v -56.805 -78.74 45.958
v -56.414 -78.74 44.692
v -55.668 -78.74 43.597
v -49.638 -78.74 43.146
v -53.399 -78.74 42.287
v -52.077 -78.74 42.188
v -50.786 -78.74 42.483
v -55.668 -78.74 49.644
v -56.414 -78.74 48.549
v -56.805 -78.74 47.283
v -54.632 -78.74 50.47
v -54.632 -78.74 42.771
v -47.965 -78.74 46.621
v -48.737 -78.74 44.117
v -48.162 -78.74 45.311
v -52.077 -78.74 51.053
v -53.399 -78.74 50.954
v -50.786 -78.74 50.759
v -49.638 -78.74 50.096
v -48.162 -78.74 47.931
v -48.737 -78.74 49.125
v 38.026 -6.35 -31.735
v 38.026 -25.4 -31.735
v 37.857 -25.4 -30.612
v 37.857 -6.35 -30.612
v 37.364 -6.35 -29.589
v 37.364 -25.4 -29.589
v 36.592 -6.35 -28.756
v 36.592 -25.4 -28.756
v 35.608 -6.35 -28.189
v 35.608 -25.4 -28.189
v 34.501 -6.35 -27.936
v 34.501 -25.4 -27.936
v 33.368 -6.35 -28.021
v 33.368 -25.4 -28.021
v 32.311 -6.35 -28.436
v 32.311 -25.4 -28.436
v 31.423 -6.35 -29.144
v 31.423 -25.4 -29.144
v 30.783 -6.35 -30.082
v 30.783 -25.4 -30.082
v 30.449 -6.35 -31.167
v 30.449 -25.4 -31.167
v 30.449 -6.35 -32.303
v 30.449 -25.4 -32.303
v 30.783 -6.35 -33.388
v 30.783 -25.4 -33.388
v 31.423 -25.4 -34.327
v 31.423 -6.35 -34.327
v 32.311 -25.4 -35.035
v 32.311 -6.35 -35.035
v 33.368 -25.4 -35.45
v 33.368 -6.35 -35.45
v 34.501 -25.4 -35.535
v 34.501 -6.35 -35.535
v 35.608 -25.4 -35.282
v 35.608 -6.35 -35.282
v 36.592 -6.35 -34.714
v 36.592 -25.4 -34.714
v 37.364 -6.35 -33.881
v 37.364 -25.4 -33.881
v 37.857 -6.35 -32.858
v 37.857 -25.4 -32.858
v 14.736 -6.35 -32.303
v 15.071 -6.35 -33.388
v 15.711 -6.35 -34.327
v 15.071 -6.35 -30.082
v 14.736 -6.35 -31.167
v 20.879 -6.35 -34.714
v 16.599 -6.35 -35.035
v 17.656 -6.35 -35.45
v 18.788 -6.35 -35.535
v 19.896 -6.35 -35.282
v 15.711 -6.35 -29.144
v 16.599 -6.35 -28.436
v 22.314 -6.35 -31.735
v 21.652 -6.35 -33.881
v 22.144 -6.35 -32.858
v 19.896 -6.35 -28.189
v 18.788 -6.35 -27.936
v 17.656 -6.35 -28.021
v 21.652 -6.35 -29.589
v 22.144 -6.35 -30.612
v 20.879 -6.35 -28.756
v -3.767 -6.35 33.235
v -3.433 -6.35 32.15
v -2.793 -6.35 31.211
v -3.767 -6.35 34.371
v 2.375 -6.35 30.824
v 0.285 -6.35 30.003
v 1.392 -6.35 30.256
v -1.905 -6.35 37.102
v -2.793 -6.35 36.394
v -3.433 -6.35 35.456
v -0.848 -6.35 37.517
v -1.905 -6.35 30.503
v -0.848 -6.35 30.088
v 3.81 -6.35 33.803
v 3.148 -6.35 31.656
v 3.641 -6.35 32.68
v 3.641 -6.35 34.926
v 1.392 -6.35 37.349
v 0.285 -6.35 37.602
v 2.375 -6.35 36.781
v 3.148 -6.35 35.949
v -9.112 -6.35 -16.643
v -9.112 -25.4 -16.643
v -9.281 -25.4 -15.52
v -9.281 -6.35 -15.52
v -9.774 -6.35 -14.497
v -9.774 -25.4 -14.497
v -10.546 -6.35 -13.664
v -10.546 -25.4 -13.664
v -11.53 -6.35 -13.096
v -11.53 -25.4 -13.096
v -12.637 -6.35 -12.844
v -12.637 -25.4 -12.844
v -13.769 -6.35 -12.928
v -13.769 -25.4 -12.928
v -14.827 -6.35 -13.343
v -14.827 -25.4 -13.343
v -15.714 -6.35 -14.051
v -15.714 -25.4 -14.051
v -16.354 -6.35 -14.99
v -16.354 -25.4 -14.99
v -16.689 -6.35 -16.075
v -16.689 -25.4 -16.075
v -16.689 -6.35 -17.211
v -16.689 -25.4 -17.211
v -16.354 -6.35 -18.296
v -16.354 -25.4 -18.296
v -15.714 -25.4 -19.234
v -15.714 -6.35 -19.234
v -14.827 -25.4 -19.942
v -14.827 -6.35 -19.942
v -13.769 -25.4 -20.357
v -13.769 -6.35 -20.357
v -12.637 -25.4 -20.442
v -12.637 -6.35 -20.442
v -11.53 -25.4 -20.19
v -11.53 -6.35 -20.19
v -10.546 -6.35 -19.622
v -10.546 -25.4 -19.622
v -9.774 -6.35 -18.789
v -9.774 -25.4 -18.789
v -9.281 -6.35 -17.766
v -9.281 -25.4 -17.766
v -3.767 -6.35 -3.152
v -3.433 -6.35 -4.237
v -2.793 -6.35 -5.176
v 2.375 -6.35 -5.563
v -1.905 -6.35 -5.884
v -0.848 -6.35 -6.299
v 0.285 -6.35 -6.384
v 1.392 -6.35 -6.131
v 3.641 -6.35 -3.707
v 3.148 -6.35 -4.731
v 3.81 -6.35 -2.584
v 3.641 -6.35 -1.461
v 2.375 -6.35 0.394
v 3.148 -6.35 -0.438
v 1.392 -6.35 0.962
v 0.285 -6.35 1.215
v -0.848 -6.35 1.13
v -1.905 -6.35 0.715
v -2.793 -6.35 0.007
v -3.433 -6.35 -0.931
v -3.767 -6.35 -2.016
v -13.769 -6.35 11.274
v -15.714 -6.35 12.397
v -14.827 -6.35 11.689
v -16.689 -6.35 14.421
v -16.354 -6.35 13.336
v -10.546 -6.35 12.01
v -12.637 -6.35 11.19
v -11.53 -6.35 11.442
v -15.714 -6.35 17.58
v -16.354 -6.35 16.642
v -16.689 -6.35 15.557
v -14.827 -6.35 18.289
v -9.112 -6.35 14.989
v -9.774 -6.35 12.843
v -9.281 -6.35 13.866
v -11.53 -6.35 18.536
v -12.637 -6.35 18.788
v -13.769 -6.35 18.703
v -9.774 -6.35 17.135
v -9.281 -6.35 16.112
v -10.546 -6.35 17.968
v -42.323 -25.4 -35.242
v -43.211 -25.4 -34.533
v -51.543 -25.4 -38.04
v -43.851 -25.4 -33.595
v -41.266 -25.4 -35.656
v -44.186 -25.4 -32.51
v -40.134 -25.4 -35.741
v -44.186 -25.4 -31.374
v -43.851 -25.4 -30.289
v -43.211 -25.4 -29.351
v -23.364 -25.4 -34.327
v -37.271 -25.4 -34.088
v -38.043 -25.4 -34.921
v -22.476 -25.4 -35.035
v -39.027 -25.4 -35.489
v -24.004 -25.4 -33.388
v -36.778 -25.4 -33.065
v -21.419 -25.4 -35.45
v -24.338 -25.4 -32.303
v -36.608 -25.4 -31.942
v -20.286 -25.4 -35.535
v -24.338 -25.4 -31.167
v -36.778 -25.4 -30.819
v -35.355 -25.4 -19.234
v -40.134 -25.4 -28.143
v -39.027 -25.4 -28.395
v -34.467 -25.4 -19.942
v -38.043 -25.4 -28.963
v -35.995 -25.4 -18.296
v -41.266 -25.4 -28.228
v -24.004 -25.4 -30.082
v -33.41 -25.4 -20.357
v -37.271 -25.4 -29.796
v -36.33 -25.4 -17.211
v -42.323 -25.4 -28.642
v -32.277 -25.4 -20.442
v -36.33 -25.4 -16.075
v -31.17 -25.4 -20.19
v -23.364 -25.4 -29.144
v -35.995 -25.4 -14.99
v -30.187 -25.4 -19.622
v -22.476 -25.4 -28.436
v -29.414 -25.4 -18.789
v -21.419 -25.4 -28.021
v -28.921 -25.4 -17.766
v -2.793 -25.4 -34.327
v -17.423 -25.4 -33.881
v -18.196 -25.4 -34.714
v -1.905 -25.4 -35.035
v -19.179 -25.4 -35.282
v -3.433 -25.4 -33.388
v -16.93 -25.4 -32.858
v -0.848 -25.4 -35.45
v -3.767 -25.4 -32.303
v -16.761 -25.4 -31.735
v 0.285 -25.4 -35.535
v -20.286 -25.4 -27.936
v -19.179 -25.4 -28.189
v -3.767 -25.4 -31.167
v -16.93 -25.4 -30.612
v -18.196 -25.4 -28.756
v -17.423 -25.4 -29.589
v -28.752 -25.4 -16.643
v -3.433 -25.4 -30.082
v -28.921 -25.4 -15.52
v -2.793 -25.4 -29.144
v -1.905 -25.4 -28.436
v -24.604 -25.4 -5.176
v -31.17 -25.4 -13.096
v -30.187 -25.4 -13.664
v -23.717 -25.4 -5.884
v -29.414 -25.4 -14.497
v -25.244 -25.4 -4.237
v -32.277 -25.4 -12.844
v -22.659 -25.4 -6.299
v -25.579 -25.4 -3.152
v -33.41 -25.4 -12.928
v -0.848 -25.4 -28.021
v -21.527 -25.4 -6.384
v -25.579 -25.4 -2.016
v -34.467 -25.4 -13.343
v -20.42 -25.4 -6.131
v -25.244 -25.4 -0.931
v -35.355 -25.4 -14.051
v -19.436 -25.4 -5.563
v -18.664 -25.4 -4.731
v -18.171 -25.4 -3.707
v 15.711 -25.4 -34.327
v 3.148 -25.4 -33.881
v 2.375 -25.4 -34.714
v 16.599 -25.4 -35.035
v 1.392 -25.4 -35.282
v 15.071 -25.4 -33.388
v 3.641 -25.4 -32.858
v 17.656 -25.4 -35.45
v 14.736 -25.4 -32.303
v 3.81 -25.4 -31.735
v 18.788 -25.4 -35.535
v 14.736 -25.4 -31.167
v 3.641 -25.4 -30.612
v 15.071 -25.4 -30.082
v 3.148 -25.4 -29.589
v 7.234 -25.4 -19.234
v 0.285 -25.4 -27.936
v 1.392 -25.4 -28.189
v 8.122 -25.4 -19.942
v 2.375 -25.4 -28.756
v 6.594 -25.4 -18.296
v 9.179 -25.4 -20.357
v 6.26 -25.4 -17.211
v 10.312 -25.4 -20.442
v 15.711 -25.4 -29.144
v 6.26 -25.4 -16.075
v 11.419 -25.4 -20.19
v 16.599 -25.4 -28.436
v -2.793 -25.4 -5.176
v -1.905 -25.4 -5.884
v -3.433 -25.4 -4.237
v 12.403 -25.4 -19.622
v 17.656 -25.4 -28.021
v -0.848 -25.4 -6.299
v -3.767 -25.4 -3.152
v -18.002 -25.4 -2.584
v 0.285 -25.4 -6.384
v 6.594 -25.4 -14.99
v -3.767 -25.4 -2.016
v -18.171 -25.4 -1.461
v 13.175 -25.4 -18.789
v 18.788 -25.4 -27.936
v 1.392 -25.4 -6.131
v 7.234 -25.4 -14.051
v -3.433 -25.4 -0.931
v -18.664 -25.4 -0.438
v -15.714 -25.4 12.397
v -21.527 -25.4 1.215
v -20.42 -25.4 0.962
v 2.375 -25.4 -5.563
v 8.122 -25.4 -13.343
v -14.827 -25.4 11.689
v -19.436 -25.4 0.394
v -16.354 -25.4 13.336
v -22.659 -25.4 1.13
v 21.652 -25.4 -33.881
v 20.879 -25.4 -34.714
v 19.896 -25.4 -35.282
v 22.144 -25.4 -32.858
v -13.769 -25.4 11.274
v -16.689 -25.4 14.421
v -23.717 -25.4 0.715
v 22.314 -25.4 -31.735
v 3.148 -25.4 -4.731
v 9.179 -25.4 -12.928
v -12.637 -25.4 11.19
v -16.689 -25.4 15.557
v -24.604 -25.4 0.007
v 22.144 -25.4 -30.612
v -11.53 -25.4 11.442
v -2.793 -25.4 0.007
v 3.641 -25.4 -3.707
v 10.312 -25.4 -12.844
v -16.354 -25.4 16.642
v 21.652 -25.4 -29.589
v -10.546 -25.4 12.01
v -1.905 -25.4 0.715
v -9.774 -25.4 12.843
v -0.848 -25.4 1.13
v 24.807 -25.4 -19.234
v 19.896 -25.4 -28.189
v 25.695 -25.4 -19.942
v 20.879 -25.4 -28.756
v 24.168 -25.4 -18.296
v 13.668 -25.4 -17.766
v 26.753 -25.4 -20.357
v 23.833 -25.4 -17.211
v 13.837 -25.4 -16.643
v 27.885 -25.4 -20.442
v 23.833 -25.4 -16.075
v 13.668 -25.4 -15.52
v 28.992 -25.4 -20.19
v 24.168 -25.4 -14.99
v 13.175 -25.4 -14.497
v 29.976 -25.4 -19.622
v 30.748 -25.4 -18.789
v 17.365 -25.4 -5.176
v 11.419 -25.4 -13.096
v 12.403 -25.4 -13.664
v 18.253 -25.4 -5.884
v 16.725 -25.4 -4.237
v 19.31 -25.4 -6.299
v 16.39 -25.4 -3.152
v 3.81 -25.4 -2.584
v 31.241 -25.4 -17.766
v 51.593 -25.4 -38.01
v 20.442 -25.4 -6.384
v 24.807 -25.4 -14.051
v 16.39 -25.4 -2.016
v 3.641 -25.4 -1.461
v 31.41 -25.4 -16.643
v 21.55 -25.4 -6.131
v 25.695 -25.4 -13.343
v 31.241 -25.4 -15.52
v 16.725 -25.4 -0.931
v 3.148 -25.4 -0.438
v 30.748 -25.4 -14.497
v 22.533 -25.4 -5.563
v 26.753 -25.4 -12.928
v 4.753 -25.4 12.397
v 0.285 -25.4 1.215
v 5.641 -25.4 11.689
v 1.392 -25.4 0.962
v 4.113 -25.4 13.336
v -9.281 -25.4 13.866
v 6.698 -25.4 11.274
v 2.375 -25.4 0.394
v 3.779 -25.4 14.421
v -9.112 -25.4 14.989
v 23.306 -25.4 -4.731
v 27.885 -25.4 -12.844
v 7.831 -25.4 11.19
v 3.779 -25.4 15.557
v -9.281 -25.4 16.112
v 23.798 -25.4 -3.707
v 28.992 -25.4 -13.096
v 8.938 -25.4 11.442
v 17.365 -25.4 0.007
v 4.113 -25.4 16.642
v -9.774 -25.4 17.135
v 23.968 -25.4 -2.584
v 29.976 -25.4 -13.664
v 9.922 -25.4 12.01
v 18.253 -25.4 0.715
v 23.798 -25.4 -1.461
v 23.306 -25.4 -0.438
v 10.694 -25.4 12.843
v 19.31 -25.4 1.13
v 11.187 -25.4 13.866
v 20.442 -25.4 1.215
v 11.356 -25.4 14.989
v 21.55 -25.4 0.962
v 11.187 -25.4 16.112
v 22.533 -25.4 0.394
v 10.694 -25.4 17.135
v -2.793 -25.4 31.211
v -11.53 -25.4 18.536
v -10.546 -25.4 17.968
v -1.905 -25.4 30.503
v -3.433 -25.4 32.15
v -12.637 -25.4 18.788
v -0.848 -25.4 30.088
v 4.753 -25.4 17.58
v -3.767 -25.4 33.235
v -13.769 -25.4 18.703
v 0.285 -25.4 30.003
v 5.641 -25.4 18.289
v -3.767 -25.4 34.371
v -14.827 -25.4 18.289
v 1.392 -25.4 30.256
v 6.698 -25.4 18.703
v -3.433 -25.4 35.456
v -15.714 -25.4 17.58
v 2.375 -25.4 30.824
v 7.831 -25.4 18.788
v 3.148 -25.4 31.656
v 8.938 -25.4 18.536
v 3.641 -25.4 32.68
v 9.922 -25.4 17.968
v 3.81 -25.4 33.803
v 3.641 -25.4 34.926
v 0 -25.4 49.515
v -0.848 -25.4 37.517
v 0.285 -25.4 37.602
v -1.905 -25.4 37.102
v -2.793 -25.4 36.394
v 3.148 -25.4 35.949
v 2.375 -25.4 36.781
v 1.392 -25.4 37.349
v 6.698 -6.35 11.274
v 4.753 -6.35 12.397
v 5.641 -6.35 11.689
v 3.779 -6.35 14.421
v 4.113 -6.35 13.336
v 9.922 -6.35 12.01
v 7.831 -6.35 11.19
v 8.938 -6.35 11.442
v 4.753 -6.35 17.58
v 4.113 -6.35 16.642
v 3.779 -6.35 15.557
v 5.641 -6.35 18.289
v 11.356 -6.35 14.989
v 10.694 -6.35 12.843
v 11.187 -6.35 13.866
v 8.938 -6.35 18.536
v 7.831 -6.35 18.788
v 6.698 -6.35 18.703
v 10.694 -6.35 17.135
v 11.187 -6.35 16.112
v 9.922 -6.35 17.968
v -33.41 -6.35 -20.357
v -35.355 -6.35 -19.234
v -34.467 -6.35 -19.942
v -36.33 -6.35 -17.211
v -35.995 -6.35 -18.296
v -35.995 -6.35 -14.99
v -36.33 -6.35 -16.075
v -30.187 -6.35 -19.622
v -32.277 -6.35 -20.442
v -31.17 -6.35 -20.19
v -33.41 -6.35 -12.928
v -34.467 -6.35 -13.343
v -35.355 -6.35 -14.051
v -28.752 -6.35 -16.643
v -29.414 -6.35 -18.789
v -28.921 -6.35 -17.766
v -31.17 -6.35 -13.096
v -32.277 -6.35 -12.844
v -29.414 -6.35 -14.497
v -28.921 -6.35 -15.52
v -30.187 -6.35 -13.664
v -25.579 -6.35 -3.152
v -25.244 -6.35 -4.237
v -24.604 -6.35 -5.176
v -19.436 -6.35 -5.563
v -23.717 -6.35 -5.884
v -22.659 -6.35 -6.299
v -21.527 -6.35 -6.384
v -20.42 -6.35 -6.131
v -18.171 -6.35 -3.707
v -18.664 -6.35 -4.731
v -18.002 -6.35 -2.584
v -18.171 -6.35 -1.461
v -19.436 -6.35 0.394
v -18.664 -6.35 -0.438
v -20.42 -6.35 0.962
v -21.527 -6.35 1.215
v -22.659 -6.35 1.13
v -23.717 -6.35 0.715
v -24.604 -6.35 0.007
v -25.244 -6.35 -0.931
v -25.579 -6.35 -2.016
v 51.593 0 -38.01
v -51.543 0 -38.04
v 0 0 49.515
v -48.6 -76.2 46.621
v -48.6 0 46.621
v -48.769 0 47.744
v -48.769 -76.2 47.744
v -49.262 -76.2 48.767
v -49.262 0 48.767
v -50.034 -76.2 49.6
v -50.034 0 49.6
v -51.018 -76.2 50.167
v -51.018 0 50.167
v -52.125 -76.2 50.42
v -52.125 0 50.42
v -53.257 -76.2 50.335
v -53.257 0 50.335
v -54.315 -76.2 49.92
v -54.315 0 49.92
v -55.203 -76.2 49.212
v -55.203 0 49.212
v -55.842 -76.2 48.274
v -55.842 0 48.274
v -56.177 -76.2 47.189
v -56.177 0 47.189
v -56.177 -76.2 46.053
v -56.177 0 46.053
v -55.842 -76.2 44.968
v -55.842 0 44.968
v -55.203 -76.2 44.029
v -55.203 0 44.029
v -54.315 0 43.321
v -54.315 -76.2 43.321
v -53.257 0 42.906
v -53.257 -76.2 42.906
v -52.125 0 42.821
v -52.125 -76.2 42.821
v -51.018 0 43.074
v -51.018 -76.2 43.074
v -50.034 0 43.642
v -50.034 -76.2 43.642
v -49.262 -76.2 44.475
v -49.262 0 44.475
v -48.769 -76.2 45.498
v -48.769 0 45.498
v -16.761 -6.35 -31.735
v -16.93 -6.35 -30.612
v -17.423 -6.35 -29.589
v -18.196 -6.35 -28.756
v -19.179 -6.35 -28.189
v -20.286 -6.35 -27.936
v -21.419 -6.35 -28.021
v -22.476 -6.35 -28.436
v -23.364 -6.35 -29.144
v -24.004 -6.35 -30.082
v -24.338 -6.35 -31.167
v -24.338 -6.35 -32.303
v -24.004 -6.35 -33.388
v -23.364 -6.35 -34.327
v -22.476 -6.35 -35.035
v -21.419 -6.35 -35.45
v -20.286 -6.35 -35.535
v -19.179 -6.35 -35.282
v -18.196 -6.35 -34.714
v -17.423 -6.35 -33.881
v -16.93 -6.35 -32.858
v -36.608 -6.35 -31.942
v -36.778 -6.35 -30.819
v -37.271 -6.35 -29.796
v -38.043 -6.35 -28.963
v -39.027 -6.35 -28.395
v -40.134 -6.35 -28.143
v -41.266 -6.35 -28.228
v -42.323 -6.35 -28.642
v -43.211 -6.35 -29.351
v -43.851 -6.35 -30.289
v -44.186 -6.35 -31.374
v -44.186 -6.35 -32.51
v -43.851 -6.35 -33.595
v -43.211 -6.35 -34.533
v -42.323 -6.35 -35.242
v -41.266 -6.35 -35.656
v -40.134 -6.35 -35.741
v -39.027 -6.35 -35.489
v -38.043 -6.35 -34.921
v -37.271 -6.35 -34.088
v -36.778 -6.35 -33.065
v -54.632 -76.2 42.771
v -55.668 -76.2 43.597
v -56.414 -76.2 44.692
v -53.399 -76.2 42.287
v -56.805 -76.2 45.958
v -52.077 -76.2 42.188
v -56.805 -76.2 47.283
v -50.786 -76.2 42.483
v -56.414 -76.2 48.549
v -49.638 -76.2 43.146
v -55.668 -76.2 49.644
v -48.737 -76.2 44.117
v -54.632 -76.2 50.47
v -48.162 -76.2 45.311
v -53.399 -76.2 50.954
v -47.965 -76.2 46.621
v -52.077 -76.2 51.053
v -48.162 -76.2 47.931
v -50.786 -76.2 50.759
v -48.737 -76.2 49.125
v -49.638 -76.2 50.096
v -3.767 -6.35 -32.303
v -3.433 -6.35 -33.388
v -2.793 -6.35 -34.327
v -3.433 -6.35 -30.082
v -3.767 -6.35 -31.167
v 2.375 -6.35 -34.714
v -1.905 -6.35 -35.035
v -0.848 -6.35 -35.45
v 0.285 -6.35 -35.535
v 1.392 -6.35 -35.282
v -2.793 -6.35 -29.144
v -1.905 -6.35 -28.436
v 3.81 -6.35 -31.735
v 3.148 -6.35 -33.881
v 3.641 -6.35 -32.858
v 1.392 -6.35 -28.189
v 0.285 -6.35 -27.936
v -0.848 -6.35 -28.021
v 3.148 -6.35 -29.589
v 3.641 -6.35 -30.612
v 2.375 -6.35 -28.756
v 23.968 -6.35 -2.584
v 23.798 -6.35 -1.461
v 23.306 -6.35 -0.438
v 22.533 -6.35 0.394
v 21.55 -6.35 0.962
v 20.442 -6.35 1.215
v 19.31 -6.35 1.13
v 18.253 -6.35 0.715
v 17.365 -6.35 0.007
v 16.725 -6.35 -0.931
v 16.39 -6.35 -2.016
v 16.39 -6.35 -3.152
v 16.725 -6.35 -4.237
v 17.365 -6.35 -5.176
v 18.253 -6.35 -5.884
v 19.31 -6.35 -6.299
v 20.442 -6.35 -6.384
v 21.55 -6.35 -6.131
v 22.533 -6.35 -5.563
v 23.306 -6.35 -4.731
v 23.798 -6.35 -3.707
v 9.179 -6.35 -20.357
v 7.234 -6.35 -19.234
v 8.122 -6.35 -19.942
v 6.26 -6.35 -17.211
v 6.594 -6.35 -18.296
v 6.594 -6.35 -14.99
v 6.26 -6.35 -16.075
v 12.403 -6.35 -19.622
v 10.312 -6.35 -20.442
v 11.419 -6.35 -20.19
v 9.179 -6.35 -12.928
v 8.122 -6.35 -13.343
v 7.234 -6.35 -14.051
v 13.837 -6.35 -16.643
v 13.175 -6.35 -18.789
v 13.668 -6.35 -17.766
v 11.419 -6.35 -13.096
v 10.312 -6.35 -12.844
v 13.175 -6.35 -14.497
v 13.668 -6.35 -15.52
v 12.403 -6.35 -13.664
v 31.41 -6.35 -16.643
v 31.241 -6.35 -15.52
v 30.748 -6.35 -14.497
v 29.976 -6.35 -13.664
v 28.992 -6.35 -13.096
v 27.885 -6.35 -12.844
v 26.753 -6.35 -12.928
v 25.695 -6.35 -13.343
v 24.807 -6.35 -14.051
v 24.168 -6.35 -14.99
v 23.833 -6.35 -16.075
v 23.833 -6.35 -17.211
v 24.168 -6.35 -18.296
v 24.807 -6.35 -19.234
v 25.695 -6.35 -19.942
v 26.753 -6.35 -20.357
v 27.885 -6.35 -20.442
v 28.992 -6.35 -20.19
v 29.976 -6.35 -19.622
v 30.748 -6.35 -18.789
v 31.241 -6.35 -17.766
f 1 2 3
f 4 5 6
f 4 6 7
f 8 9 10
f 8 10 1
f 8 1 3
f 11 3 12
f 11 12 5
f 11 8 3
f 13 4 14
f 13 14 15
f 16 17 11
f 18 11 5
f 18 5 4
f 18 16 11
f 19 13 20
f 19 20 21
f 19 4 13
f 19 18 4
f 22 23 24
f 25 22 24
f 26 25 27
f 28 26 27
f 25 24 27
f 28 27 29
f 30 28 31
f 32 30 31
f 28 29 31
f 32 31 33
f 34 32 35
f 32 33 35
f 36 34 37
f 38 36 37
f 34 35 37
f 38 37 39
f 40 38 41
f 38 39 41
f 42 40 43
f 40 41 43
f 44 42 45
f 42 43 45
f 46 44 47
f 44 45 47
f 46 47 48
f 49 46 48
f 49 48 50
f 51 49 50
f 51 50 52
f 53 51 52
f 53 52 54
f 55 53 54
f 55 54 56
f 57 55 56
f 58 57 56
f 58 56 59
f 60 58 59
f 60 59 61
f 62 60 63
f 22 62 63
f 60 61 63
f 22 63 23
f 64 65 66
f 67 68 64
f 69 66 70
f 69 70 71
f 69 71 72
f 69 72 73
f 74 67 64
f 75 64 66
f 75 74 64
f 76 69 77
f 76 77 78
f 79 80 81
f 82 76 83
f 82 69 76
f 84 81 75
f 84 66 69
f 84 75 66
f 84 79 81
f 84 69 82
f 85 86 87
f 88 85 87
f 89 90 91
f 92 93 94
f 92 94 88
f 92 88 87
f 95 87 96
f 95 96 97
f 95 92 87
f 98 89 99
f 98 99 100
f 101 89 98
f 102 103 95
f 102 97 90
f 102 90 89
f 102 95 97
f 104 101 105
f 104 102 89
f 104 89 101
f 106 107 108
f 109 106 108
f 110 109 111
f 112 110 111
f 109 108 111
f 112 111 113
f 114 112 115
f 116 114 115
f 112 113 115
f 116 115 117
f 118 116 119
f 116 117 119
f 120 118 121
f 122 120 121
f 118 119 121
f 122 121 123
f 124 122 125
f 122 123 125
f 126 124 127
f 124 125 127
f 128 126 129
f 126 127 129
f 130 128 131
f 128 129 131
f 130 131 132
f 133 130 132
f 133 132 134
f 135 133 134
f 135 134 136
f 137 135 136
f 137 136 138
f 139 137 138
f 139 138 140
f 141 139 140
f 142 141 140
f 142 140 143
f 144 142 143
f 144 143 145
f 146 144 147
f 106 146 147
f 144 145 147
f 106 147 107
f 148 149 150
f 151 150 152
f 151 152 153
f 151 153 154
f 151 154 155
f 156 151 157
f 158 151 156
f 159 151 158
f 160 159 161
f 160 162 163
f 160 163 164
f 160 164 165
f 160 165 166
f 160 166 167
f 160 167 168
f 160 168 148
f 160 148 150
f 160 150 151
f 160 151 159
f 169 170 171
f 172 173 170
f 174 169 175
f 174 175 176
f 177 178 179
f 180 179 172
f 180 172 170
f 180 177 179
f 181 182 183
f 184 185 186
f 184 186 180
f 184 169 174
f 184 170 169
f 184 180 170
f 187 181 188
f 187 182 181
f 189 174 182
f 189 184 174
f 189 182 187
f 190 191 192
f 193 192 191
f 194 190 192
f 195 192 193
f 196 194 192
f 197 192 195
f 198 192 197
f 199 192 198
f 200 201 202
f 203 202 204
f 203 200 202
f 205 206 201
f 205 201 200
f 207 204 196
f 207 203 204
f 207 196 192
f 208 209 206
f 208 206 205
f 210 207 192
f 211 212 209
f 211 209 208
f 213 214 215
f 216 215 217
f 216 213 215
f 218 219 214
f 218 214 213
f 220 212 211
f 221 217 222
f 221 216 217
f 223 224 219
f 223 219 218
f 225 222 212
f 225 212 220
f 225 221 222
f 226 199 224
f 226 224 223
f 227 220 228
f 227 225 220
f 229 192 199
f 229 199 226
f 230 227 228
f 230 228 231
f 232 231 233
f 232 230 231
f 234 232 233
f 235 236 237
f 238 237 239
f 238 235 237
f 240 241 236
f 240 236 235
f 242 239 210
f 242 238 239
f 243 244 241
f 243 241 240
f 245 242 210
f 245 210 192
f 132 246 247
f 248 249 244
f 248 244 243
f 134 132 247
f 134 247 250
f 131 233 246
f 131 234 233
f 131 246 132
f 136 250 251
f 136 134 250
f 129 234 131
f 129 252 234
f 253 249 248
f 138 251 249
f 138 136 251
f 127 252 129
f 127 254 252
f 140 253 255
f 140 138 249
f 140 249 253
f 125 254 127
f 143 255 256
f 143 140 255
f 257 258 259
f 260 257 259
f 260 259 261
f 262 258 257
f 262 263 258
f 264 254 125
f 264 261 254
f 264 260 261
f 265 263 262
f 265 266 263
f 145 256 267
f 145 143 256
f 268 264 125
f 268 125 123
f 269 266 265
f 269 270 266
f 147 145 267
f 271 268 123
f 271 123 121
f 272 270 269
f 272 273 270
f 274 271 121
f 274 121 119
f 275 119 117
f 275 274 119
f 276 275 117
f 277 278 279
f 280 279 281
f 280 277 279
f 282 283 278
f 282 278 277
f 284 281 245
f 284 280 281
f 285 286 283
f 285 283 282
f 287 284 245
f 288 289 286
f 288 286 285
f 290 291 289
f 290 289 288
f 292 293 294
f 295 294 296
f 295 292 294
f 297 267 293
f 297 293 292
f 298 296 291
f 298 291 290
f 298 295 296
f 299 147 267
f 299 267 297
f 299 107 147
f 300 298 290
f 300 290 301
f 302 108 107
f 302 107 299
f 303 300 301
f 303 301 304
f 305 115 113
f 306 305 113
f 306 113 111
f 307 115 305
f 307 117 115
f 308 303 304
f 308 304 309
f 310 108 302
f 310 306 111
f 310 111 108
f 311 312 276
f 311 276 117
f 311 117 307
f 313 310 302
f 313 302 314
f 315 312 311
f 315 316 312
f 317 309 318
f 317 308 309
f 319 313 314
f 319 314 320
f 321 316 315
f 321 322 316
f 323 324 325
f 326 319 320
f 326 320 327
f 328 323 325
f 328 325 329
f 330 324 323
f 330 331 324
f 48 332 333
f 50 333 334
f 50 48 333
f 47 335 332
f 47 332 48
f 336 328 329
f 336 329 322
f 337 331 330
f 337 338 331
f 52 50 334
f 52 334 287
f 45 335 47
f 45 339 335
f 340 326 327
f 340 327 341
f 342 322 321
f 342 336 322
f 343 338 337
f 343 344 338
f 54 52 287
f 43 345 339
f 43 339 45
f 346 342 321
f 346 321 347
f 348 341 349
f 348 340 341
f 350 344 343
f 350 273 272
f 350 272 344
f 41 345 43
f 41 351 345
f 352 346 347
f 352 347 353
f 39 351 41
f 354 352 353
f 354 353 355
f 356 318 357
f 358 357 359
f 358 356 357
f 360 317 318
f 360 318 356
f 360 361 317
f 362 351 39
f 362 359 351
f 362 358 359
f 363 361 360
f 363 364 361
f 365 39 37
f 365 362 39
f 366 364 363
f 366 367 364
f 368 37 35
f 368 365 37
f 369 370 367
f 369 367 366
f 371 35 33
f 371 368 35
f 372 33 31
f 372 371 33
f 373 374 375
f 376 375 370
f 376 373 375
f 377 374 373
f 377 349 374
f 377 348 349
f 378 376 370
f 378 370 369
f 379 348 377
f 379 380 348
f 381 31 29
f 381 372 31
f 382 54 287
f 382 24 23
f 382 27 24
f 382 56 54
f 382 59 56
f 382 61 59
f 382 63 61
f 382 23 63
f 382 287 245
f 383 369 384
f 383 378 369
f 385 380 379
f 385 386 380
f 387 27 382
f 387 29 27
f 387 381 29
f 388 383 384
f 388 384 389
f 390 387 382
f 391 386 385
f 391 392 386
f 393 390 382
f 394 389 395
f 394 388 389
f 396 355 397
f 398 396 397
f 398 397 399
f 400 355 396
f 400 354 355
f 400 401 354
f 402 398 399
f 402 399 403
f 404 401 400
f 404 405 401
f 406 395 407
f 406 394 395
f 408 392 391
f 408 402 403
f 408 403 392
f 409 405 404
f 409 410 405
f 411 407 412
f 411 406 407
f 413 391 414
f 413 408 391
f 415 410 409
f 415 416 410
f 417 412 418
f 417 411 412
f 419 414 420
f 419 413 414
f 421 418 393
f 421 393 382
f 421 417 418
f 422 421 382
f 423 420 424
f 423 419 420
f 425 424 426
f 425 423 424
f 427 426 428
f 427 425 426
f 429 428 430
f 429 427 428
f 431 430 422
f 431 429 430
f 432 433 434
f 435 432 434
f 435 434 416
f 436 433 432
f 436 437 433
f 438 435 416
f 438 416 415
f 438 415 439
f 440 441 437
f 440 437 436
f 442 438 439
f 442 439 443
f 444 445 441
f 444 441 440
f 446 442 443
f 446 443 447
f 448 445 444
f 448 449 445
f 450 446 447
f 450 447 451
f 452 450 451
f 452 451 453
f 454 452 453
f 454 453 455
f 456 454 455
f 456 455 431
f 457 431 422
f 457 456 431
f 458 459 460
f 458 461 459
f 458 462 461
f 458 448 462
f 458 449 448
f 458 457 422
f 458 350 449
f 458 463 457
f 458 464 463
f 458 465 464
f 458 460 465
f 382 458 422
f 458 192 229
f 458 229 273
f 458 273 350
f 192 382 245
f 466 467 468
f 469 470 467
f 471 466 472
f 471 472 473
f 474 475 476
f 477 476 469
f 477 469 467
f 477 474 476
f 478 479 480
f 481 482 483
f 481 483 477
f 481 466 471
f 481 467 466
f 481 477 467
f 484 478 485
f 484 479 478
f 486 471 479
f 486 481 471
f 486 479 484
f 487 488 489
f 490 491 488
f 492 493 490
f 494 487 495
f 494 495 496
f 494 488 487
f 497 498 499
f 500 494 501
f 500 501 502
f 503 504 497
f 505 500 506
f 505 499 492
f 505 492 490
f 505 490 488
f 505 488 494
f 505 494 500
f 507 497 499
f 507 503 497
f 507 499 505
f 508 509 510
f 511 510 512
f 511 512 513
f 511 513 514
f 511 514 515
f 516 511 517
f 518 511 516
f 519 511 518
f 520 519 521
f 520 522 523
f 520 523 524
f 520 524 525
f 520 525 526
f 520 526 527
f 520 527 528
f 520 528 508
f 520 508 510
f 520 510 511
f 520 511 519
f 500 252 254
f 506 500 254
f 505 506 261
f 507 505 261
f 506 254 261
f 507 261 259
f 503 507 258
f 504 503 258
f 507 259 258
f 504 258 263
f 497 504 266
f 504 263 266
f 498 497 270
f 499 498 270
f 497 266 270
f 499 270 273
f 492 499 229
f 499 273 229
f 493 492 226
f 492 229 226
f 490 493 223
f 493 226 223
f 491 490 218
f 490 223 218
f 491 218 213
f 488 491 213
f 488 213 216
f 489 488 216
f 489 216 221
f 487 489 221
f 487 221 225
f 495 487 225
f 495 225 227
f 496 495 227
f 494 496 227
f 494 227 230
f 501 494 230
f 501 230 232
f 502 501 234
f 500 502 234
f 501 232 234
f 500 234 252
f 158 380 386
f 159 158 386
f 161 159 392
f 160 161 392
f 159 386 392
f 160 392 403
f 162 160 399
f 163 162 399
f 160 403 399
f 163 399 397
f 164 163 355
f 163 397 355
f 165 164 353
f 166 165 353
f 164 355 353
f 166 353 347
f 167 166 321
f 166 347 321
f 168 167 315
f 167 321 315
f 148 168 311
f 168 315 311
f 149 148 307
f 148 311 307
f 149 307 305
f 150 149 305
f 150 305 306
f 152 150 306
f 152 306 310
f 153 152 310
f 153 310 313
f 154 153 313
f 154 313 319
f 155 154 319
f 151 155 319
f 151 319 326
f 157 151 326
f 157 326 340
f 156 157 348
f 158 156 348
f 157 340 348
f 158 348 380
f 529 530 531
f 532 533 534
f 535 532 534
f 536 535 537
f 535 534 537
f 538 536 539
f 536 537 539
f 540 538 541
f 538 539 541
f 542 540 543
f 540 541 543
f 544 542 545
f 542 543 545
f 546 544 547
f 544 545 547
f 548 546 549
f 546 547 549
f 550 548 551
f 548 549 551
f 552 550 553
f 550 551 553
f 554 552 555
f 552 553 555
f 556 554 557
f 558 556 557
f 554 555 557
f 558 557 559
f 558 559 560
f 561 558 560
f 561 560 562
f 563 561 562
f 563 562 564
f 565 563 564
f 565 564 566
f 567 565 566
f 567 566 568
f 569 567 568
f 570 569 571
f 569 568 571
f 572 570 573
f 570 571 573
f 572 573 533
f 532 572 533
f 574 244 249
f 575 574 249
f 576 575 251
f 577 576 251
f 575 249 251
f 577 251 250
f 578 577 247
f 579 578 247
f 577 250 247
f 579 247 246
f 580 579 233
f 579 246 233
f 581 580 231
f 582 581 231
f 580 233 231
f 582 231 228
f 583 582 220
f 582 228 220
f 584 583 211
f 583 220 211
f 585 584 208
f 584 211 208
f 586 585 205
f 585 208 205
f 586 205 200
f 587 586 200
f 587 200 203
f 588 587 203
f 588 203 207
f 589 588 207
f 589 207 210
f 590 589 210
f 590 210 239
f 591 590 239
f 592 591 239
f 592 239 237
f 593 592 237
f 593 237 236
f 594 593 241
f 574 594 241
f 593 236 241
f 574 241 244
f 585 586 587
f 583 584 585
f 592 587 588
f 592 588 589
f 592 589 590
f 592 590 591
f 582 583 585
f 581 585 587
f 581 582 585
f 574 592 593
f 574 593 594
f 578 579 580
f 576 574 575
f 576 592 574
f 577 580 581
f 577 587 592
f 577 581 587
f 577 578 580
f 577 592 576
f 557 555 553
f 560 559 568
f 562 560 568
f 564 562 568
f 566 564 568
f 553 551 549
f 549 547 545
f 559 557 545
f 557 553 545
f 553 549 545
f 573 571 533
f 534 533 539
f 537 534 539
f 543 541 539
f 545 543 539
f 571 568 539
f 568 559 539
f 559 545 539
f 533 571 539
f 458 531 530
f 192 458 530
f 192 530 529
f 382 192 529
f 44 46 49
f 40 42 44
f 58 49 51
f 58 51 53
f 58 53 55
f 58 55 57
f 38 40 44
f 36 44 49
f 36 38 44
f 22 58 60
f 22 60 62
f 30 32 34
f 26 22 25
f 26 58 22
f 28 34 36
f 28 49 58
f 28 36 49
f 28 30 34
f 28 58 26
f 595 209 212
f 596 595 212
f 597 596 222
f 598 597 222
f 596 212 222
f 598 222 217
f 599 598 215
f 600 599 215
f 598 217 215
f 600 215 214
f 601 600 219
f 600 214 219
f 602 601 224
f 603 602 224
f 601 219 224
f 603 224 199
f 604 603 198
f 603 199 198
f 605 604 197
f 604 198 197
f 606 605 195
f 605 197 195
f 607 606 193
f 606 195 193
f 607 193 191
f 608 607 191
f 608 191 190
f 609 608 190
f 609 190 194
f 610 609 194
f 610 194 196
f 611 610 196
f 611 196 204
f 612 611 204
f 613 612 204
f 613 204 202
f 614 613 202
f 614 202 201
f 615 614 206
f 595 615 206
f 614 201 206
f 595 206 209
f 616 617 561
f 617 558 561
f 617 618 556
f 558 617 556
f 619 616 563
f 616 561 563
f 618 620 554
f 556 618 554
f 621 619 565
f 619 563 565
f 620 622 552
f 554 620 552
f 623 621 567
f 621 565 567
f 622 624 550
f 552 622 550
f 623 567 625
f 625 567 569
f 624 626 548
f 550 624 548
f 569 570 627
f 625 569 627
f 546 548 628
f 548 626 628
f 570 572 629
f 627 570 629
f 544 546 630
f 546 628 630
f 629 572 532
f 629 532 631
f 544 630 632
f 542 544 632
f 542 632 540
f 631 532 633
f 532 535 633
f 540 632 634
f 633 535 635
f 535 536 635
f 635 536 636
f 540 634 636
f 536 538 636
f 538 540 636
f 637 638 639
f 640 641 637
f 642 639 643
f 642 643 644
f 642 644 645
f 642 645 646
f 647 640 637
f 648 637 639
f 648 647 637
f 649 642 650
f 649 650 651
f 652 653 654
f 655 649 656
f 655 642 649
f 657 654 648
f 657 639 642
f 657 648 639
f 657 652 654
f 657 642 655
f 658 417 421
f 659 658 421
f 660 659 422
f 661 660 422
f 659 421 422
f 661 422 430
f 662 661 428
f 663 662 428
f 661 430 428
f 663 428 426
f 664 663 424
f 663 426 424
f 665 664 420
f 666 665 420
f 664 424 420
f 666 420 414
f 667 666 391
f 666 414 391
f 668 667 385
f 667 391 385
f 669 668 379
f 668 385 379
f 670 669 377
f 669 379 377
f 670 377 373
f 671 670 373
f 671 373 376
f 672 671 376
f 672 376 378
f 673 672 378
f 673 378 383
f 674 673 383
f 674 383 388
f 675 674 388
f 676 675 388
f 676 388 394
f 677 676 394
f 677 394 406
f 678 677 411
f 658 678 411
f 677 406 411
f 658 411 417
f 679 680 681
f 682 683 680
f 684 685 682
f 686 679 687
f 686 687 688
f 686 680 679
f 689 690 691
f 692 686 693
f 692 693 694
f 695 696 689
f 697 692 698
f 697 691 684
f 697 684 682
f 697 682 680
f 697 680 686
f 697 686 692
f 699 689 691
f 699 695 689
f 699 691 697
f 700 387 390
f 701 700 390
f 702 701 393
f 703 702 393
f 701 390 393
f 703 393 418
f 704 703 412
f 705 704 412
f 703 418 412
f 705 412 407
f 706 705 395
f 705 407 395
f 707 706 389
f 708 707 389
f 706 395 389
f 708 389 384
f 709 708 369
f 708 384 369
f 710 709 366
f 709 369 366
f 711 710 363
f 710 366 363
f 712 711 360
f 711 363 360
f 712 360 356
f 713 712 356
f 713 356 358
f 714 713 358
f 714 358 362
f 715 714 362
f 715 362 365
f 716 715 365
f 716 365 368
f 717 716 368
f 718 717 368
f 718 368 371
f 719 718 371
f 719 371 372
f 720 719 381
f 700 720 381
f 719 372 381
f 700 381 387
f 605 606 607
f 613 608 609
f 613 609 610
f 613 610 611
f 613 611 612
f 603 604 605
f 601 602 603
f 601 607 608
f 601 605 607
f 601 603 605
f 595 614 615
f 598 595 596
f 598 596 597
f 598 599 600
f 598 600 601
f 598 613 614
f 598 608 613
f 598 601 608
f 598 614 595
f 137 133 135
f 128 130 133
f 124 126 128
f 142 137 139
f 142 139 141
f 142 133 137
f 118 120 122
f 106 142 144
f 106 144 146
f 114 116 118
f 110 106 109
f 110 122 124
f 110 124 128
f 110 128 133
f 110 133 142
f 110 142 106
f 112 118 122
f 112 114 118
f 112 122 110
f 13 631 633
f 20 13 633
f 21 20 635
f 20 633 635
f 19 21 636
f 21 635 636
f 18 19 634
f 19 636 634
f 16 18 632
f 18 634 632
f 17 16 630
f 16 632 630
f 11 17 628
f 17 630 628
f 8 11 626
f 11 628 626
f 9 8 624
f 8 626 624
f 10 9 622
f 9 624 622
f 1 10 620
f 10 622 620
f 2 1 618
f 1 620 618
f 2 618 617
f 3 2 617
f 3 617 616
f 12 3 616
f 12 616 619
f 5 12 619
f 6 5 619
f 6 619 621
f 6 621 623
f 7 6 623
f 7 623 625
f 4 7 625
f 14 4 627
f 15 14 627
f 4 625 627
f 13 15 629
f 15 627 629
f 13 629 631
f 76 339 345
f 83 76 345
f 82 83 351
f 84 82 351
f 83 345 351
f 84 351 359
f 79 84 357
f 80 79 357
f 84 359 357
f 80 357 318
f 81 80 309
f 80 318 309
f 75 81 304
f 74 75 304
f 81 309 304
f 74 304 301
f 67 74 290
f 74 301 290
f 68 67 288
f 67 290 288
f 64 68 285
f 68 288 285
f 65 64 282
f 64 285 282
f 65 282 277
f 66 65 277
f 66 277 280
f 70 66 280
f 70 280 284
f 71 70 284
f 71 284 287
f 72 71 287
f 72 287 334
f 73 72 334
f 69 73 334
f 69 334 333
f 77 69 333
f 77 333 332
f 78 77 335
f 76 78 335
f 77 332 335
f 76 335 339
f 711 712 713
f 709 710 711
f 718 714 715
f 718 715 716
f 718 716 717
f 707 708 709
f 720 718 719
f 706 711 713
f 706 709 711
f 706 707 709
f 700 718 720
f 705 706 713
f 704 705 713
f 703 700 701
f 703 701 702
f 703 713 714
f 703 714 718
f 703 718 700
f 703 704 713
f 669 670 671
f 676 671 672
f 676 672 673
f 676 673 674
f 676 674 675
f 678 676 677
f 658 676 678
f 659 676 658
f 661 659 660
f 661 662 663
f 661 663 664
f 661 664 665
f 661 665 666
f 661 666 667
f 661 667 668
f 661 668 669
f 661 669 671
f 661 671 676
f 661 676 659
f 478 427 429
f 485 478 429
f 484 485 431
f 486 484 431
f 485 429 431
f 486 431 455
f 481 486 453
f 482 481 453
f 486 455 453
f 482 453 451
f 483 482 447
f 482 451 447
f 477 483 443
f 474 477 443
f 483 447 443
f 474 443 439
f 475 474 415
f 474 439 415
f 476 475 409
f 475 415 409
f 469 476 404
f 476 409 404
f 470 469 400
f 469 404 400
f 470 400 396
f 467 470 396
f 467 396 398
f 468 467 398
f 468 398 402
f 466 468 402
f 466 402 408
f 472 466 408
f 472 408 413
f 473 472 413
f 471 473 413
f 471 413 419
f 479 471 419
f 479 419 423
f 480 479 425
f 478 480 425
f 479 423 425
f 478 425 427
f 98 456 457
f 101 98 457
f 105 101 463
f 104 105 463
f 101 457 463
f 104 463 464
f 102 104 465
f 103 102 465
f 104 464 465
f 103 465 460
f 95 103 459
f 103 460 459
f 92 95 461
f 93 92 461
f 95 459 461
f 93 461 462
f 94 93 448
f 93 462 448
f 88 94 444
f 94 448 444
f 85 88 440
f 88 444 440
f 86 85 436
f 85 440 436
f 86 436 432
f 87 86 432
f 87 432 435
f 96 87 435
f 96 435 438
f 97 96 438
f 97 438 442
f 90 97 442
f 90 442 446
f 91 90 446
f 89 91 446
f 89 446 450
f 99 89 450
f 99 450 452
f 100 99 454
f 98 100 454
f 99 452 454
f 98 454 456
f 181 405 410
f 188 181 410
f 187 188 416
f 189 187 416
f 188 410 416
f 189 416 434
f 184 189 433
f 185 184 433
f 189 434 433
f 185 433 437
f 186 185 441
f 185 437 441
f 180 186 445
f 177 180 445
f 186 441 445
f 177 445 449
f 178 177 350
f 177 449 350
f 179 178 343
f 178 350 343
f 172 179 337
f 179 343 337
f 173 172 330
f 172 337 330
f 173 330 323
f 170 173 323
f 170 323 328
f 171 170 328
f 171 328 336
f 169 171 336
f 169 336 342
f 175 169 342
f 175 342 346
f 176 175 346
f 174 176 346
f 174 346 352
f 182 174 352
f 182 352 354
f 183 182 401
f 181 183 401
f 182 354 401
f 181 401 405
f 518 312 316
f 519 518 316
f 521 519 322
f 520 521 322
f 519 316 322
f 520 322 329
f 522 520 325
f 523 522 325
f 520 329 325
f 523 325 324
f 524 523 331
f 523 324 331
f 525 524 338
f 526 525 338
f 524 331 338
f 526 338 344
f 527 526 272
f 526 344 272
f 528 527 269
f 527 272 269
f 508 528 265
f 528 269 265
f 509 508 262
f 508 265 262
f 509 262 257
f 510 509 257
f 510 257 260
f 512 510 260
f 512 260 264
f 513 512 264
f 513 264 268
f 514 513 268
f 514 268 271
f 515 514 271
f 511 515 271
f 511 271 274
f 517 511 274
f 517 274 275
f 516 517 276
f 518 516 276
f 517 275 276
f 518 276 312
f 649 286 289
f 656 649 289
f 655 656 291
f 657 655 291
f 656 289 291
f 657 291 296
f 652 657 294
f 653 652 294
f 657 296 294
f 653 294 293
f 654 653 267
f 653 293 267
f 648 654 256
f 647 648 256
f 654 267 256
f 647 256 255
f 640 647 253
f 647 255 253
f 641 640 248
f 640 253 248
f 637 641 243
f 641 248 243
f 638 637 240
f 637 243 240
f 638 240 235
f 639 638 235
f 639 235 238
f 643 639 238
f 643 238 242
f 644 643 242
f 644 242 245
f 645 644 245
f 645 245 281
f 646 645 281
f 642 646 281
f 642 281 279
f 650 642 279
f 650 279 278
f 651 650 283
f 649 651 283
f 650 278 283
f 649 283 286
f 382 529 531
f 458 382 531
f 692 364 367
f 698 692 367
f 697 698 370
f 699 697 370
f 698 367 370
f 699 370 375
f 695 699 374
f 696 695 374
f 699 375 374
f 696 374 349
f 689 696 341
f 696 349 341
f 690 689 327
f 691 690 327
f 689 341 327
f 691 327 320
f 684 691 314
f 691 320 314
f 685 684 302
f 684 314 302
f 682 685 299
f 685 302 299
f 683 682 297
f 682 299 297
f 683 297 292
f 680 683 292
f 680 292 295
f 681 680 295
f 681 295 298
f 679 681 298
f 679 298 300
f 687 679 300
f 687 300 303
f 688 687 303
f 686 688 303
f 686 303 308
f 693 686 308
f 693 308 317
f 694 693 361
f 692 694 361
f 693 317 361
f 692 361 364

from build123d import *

# Parameters (mm, degrees)
F1_DEPTH = 25.4
F2_R     = 3.81
F3_DEPTH = 19.05
F4_R     = 3.81
F5_DEPTH = 76.2
F6_R     = 4.445
F7_DEPTH = 2.54


with BuildPart() as f1:
    # F0 (on Front) → F1 (new body)
    with BuildSketch(Plane.XZ):
        Polygon((51.592913, -38.010372), (0, 49.515232), (-51.542935, -38.039812), align=None)
    extrude(amount=F1_DEPTH)

    # F2 (on face) → F3 (cut)
    with BuildSketch(Plane.XZ.offset(25.4)):
        with Locations((0, 33.802673)):
            Circle(F2_R)
        with Locations((-12.921512, 14.988953)):
            Circle(F2_R)
        with Locations((7.546162, 14.988953)):
            Circle(F2_R)
        with Locations((-21.811511, -2.584302)):
            Circle(F2_R)
        with Locations((0, -2.584302)):
            Circle(F2_R)
        with Locations((20.157559, -2.584302)):
            Circle(F2_R)
        with Locations((-32.562207, -16.642908)):
            Circle(F2_R)
        with Locations((-12.921512, -16.642908)):
            Circle(F2_R)
        with Locations((10.027092, -16.642908)):
            Circle(F2_R)
        with Locations((27.600348, -16.642908)):
            Circle(F2_R)
        with Locations((-40.418487, -31.941976)):
            Circle(F2_R)
        with Locations((-20.571047, -31.735234)):
            Circle(F2_R)
        with Locations((0, -31.735234)):
            Circle(F2_R)
        with Locations((18.503606, -31.735234)):
            Circle(F2_R)
        with Locations((34.216166, -31.735234)):
            Circle(F2_R)
    extrude(amount=-F3_DEPTH, mode=Mode.SUBTRACT)


with BuildPart() as f5:
    # F4 (on Front) → F5 (new body)
    with BuildSketch(Plane.XZ):
        with Locations((-52.409653, 46.620812)):
            Circle(F4_R)
    extrude(amount=F5_DEPTH)

    # F6 (on face) → F7 (join)
    with BuildSketch(Plane.XZ.offset(76.2)):
        with Locations((-52.409653, 46.620812)):
            Circle(F6_R)
    extrude(amount=F7_DEPTH)


solid = Compound([f1.part, f5.part])
